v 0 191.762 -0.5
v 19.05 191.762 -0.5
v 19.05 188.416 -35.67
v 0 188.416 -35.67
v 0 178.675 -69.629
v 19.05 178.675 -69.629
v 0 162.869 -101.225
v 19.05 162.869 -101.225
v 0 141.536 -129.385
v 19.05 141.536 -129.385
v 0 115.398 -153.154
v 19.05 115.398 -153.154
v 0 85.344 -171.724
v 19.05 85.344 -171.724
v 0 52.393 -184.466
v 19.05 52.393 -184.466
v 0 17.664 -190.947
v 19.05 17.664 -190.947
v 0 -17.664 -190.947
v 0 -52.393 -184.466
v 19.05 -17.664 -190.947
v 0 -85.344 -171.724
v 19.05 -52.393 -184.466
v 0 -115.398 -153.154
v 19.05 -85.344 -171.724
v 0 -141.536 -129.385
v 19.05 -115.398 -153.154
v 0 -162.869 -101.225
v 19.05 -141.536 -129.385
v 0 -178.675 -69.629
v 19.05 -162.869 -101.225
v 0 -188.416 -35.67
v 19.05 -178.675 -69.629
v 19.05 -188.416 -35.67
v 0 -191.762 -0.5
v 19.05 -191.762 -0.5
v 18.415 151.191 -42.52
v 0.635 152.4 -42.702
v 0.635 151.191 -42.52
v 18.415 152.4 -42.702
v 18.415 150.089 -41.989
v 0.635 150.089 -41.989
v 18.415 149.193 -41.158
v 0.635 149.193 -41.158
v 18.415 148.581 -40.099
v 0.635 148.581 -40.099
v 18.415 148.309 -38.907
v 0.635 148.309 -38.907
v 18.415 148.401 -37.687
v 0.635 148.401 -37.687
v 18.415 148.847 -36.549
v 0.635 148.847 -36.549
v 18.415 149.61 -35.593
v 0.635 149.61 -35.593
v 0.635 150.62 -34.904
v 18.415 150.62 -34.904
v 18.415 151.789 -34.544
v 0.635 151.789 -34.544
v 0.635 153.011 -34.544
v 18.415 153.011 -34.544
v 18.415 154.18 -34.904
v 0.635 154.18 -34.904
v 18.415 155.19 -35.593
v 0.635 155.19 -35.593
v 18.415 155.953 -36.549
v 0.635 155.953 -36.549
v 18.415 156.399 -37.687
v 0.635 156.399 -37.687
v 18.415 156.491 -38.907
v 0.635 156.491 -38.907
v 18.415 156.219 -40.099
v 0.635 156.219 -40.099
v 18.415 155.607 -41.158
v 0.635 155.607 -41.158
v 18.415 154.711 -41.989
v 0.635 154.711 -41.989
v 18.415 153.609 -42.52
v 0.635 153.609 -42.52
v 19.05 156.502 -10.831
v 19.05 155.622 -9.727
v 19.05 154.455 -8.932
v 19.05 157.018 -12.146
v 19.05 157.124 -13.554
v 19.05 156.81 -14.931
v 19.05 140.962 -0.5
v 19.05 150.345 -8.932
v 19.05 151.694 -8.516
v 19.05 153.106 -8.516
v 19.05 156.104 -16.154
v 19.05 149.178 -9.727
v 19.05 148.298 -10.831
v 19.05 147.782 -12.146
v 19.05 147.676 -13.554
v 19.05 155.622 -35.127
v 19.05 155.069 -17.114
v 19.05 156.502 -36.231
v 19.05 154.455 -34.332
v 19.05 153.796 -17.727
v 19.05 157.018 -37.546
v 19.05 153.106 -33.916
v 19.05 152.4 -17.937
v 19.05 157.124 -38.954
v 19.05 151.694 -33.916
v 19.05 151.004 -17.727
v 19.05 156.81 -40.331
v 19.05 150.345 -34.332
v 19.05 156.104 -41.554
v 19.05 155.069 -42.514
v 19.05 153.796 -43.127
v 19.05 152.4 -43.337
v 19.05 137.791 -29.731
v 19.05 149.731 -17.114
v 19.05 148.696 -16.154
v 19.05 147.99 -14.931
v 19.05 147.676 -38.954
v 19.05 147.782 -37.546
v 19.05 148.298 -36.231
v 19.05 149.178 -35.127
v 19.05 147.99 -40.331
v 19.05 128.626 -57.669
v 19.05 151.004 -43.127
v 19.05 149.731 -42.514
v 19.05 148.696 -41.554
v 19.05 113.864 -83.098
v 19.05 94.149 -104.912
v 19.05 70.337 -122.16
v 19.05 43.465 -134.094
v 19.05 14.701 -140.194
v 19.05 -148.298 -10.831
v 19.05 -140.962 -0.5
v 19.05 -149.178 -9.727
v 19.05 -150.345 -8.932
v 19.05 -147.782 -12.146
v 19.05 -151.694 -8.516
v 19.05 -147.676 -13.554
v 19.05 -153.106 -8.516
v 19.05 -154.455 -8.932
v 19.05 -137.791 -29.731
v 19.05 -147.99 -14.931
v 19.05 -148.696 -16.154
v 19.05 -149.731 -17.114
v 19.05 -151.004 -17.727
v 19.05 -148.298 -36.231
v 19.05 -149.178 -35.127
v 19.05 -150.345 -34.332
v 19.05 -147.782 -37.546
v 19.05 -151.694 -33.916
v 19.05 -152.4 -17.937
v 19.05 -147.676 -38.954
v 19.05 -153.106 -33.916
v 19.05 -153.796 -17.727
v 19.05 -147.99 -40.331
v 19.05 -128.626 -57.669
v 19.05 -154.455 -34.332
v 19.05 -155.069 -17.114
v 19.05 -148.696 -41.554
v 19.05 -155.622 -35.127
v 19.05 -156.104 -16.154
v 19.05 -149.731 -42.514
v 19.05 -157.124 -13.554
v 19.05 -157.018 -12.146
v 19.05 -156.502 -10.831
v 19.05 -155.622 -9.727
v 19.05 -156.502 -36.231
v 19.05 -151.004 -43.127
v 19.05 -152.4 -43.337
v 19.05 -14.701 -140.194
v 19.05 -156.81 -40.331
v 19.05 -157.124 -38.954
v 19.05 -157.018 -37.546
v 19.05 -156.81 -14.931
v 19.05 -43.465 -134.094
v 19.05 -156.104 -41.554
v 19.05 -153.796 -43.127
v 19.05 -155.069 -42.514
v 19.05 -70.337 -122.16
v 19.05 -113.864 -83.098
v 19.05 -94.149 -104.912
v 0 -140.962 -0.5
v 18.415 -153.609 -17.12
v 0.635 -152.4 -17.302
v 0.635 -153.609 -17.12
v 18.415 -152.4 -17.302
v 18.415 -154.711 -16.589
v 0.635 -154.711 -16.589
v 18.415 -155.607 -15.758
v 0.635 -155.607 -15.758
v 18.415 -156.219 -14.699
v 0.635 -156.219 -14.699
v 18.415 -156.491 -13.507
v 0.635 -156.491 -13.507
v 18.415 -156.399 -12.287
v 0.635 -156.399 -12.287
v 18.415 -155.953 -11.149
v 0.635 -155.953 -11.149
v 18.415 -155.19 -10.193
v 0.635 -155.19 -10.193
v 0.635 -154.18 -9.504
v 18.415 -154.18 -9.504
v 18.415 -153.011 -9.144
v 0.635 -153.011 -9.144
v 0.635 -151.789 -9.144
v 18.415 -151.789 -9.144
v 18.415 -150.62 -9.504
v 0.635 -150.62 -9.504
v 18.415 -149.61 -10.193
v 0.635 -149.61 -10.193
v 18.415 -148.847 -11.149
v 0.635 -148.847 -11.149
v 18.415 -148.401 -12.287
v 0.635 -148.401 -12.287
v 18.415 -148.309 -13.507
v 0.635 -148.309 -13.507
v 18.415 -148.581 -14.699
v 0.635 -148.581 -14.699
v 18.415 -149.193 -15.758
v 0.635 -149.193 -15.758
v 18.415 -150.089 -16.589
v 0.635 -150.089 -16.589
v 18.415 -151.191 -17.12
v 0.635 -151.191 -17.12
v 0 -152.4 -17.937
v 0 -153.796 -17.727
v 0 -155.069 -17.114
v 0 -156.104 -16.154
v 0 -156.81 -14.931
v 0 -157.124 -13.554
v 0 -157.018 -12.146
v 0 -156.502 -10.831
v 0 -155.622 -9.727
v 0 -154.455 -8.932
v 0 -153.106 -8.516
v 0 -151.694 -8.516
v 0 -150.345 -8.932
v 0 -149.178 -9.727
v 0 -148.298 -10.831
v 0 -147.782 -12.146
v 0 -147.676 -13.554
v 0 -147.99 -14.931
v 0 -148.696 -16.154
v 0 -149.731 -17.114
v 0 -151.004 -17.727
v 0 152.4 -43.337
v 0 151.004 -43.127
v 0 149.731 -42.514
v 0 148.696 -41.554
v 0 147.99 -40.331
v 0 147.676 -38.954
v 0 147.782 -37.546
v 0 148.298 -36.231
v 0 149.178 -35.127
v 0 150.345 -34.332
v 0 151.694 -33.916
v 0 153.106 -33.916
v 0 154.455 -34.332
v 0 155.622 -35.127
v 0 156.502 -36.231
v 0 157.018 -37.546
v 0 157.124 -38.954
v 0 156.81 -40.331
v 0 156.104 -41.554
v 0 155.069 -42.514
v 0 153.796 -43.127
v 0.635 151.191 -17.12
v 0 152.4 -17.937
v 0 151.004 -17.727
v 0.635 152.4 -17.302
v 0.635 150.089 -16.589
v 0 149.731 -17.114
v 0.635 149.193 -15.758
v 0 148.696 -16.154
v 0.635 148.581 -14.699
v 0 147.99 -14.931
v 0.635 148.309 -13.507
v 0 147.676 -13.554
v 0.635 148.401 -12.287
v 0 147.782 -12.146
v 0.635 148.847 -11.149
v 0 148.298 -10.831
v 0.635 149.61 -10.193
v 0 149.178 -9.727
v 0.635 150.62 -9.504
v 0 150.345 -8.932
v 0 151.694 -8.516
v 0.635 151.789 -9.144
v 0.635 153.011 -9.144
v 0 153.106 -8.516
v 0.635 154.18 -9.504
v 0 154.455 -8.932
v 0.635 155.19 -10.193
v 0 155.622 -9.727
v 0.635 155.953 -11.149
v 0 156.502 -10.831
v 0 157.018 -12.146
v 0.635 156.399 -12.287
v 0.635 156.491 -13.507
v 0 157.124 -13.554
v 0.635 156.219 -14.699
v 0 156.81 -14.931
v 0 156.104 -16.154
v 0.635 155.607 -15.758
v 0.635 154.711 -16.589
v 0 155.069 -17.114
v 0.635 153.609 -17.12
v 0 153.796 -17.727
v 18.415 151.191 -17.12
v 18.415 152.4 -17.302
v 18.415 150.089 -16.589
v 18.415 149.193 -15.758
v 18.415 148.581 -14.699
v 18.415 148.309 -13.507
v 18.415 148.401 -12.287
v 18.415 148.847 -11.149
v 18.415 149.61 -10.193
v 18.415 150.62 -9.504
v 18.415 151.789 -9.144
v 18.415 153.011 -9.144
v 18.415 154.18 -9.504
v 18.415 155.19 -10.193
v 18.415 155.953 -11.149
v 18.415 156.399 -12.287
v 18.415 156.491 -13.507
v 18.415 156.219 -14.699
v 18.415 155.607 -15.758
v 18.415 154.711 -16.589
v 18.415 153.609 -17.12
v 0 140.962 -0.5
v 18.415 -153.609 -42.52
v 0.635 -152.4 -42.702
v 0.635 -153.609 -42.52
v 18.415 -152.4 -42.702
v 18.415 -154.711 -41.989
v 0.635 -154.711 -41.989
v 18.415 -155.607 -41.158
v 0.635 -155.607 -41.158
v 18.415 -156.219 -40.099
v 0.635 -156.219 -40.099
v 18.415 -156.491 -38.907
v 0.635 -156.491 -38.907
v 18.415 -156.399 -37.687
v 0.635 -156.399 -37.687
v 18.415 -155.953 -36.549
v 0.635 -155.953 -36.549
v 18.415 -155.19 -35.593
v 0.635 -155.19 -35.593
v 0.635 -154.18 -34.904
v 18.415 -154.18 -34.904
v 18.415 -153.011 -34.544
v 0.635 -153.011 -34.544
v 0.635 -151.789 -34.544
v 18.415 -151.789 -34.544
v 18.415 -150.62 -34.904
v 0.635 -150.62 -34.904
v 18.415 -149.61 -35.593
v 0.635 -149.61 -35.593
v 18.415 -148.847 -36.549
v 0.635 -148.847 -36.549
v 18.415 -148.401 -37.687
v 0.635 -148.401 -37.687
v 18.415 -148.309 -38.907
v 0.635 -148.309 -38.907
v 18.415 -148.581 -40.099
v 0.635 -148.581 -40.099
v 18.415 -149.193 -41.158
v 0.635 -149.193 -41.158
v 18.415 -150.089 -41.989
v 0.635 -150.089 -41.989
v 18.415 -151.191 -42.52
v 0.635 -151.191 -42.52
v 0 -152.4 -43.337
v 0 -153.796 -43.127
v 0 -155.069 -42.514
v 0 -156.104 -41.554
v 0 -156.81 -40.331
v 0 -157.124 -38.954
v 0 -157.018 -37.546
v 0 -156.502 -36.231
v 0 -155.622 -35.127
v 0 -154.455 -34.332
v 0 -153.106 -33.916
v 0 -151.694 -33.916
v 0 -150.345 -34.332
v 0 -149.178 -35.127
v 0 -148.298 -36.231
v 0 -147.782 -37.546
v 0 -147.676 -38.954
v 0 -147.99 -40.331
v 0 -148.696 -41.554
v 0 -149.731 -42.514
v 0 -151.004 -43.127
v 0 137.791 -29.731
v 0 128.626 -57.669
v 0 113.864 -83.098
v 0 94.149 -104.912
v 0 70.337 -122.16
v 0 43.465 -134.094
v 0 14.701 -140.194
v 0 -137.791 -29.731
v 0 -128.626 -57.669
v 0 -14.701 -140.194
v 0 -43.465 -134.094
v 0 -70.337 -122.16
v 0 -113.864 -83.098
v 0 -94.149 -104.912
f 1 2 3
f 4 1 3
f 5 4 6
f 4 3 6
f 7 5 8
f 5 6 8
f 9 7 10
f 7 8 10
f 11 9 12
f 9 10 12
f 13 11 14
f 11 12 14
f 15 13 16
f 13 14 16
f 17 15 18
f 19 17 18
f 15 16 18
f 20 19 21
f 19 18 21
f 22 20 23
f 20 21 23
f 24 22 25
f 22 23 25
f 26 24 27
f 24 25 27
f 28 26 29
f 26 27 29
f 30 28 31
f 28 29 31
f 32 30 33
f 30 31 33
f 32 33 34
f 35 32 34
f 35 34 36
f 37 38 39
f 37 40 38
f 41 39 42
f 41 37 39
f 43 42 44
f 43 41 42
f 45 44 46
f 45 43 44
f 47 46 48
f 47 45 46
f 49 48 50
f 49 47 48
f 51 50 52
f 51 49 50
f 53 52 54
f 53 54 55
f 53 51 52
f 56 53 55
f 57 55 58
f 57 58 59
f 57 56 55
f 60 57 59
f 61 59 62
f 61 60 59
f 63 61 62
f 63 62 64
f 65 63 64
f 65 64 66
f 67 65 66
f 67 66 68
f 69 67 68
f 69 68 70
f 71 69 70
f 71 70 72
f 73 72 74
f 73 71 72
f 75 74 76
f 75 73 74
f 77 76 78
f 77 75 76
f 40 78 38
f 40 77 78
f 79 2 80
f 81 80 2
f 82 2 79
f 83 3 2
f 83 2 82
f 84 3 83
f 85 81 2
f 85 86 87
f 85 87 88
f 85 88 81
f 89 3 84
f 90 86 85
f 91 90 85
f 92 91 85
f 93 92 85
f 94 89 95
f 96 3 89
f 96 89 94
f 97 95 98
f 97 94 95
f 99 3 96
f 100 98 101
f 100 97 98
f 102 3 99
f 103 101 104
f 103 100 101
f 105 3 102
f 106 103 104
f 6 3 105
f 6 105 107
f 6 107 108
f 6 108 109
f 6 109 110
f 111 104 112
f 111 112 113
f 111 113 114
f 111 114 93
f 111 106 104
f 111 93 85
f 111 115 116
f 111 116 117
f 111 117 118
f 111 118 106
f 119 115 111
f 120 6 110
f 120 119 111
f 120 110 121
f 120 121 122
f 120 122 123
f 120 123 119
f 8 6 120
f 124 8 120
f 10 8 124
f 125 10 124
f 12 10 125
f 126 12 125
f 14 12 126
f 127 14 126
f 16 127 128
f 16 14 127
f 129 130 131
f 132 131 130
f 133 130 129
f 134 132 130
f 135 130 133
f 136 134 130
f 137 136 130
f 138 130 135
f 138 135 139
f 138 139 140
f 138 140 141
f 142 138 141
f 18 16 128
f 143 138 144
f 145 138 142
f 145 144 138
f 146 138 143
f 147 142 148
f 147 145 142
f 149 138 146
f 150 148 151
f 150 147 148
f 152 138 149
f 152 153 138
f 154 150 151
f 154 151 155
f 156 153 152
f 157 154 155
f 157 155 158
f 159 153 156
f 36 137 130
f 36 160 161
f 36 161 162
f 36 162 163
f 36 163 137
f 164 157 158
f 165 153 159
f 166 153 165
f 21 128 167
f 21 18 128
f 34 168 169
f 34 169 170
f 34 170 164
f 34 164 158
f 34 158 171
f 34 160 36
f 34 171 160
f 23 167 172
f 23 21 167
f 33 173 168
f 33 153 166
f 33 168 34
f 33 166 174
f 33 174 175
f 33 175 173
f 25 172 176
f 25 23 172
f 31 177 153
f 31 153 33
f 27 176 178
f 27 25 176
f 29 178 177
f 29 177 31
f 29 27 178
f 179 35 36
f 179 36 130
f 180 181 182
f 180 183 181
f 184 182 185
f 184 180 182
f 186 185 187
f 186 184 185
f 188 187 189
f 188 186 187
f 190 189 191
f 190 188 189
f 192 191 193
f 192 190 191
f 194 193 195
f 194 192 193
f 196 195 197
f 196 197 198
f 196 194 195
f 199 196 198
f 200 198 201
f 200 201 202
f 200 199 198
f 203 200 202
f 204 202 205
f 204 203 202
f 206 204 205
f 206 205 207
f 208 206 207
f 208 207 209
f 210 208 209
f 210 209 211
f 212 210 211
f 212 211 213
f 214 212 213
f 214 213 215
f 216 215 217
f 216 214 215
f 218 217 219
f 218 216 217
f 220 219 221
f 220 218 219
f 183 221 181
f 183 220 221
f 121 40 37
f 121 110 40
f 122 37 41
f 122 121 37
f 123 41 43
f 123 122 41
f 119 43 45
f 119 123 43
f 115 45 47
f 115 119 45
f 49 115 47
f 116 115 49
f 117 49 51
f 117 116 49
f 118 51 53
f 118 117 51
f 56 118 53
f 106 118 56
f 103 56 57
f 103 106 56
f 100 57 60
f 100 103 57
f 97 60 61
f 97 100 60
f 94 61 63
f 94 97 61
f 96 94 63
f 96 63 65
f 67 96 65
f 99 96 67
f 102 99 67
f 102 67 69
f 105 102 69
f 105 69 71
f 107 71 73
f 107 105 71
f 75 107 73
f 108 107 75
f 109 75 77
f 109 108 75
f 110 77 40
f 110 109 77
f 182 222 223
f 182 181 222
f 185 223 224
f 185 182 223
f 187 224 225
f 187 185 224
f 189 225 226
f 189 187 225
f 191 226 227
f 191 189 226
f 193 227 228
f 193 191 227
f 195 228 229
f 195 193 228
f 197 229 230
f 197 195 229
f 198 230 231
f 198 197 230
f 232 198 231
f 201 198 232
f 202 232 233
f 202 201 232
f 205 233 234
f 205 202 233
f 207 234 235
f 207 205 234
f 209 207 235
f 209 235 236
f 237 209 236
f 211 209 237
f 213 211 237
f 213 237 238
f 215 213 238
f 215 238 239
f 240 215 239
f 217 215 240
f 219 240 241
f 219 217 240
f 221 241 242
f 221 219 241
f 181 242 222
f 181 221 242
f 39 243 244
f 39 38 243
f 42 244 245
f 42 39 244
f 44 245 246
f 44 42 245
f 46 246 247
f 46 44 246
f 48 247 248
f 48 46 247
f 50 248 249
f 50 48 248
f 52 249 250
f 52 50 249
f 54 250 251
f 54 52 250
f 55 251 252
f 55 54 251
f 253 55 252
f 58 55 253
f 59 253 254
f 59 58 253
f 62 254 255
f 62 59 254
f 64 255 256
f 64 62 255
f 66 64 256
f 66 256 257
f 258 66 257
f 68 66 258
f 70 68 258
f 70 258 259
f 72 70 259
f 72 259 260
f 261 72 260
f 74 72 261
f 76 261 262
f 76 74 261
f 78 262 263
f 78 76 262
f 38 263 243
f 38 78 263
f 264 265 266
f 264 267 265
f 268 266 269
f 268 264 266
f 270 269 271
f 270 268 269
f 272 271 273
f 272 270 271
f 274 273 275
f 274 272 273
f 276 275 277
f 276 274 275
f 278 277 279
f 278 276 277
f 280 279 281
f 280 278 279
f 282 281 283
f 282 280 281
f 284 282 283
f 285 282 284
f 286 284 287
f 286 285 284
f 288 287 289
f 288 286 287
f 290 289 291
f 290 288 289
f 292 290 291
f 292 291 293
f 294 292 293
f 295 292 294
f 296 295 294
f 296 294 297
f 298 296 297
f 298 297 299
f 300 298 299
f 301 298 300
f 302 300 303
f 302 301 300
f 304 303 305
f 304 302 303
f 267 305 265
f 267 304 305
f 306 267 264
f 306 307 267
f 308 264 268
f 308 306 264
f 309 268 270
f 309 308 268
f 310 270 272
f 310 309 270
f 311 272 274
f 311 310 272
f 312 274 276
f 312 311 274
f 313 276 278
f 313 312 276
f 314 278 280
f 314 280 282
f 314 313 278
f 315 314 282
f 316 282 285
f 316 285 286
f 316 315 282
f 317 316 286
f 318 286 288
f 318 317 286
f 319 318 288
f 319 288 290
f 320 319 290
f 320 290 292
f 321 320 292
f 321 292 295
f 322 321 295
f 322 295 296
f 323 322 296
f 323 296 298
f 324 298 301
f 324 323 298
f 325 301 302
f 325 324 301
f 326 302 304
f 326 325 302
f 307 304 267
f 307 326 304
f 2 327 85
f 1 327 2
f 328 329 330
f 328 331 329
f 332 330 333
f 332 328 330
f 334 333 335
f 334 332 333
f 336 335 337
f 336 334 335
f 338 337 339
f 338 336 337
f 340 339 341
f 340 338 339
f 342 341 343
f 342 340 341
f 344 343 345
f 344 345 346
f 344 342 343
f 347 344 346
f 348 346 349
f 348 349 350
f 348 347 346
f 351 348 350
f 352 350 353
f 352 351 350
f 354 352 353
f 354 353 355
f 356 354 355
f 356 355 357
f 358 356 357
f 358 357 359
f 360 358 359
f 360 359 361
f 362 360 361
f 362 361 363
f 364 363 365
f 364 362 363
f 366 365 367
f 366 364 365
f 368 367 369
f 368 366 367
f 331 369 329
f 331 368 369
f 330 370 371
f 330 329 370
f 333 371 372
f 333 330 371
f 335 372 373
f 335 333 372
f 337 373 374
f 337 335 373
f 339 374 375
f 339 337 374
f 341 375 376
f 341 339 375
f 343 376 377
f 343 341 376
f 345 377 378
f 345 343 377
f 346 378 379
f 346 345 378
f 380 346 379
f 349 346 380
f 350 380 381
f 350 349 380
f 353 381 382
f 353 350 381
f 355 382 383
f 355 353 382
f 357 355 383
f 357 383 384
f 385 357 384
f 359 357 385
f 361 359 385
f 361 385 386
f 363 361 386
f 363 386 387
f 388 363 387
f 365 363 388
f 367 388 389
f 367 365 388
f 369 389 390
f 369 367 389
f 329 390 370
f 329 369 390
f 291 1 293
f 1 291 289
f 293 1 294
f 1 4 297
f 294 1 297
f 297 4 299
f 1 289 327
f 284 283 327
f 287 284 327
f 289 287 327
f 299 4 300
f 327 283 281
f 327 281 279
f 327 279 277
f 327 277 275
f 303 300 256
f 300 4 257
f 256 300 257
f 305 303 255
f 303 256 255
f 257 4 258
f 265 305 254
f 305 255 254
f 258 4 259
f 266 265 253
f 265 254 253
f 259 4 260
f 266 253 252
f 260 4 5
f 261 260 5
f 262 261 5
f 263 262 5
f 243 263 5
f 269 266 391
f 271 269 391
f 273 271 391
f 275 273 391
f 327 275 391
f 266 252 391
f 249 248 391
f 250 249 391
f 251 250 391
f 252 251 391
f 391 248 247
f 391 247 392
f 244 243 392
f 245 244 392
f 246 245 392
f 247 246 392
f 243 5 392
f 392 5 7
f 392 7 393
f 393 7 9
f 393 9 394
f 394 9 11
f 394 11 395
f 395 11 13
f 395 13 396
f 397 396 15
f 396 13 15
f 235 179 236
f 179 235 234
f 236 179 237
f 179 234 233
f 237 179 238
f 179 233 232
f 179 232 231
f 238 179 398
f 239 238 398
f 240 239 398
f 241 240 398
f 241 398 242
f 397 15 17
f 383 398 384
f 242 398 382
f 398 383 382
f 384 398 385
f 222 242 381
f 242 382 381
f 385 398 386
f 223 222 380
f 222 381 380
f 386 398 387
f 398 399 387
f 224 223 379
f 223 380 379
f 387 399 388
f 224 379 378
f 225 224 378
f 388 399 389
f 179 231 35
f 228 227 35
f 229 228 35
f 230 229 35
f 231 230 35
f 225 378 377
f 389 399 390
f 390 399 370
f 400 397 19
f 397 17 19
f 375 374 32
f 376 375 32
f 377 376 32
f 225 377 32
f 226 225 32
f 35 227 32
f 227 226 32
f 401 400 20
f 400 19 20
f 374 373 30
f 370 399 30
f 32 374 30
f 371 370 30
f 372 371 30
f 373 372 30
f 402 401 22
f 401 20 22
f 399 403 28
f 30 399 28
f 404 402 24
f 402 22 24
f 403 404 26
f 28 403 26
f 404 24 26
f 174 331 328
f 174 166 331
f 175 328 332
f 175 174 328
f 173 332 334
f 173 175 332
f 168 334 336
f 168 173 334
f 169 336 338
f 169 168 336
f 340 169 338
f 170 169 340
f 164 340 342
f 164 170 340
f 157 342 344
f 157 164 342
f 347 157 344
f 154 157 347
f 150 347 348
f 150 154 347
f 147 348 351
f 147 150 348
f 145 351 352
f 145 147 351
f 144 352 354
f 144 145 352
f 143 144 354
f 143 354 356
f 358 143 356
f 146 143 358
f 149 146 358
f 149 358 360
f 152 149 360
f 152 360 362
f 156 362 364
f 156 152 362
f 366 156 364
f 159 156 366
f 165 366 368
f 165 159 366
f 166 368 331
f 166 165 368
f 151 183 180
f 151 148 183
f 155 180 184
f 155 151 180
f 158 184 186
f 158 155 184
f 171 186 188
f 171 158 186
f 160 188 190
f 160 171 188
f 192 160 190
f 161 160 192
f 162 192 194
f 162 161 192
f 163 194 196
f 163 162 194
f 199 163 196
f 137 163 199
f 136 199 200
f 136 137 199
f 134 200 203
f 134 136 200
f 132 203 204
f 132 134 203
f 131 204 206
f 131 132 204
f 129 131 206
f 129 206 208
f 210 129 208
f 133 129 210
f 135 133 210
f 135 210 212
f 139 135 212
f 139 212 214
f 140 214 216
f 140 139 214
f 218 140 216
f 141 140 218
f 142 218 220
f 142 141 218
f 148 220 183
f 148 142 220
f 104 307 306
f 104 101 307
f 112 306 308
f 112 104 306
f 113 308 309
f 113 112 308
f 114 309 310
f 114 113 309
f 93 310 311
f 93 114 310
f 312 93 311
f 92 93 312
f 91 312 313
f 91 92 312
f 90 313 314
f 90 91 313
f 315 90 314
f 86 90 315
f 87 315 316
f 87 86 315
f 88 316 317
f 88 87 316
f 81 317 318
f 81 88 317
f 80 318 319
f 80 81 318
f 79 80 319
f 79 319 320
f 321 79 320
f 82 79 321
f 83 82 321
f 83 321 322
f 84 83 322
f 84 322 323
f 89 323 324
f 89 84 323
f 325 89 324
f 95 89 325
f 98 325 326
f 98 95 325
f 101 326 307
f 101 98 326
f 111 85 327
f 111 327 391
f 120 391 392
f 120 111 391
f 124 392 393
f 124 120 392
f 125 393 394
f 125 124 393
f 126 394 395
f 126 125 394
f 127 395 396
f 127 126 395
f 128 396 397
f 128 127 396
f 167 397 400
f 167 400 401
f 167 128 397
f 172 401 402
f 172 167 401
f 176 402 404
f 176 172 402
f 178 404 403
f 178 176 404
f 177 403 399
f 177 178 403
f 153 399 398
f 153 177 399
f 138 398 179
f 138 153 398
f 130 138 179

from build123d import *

# Parameters (mm, degrees)
SKETCH1_W                         = 19.05
SKETCH1_H                         = 50.8
REVOLVE_THIN1_ANGLE               = 180
SKETCH81_W                        = 0.5
SKETCH81_H                        = 430
EXTRUDE1_DEPTH                    = 20.05
F_5_16_CLEARANCE_HOLE1_AT_2_COUNT = 2
F_5_16_CLEARANCE_HOLE1_AT_2_PITCH = 25.4
F_5_16_CLEARANCE_HOLE1_AT_3_COUNT = 2
F_5_16_CLEARANCE_HOLE1_AT_3_PITCH = 304.8
F_5_16_CLEARANCE_HOLE1_AT_4_COUNT = 2
F_5_16_CLEARANCE_HOLE1_AT_4_PITCH = 305.856502301


with BuildPart() as part:
    # Sketch1 → Revolve-Thin1 (revolve)
    with BuildSketch(Plane.XY):
        with Locations((9.525, 166.3625)):
            Rectangle(SKETCH1_W, SKETCH1_H)
    revolve(axis=Axis((0, 0, 0), (-1, 0, 0)), revolution_arc=REVOLVE_THIN1_ANGLE)

    # Sketch81 → Extrude1 (cut, through all)
    with BuildSketch(Plane(origin=(0, 0, 0), x_dir=(0, 0, -1), z_dir=(1, 0, 0))):
        with Locations((0.25, 0)):
            Rectangle(SKETCH81_W, SKETCH81_H)
    extrude(amount=EXTRUDE1_DEPTH, mode=Mode.SUBTRACT)

    # Sketch82 → 5_16 Clearance Hole1 (revolve, cut)
    with BuildSketch(Plane(origin=(19.05, 152.4, -38.6), x_dir=(0, 0, -1), z_dir=(0, 1, 0))):
        Polygon((0, 0), (0, 19.05), (4.7371, 19.05), (4.1021, 18.415), (4.1021, 0.635), (4.7371, 0), align=None)
    f_5_16_clearance_hole1 = revolve(axis=Axis((25.4, 152.4, -38.6), (-1, 0, 0)), mode=Mode.SUBTRACT)

    # 5_16 Clearance Hole1 at 2: 5_16 Clearance Hole1 ×2
    with Locations(*[(0, 0, i * F_5_16_CLEARANCE_HOLE1_AT_2_PITCH) for i in range(1, F_5_16_CLEARANCE_HOLE1_AT_2_COUNT)]):
        add(f_5_16_clearance_hole1, mode=Mode.SUBTRACT)

    # 5_16 Clearance Hole1 at 3: 5_16 Clearance Hole1 ×2
    with Locations(*[(0, -i * F_5_16_CLEARANCE_HOLE1_AT_3_PITCH, 0) for i in range(1, F_5_16_CLEARANCE_HOLE1_AT_3_COUNT)]):
        add(f_5_16_clearance_hole1, mode=Mode.SUBTRACT)

    # 5_16 Clearance Hole1 at 4: 5_16 Clearance Hole1 ×2
    with Locations(*[Vector(0, -0.996545758, 0.08304548) * (i * F_5_16_CLEARANCE_HOLE1_AT_4_PITCH) for i in range(1, F_5_16_CLEARANCE_HOLE1_AT_4_COUNT)]):
        add(f_5_16_clearance_hole1, mode=Mode.SUBTRACT)


solid = part.part
